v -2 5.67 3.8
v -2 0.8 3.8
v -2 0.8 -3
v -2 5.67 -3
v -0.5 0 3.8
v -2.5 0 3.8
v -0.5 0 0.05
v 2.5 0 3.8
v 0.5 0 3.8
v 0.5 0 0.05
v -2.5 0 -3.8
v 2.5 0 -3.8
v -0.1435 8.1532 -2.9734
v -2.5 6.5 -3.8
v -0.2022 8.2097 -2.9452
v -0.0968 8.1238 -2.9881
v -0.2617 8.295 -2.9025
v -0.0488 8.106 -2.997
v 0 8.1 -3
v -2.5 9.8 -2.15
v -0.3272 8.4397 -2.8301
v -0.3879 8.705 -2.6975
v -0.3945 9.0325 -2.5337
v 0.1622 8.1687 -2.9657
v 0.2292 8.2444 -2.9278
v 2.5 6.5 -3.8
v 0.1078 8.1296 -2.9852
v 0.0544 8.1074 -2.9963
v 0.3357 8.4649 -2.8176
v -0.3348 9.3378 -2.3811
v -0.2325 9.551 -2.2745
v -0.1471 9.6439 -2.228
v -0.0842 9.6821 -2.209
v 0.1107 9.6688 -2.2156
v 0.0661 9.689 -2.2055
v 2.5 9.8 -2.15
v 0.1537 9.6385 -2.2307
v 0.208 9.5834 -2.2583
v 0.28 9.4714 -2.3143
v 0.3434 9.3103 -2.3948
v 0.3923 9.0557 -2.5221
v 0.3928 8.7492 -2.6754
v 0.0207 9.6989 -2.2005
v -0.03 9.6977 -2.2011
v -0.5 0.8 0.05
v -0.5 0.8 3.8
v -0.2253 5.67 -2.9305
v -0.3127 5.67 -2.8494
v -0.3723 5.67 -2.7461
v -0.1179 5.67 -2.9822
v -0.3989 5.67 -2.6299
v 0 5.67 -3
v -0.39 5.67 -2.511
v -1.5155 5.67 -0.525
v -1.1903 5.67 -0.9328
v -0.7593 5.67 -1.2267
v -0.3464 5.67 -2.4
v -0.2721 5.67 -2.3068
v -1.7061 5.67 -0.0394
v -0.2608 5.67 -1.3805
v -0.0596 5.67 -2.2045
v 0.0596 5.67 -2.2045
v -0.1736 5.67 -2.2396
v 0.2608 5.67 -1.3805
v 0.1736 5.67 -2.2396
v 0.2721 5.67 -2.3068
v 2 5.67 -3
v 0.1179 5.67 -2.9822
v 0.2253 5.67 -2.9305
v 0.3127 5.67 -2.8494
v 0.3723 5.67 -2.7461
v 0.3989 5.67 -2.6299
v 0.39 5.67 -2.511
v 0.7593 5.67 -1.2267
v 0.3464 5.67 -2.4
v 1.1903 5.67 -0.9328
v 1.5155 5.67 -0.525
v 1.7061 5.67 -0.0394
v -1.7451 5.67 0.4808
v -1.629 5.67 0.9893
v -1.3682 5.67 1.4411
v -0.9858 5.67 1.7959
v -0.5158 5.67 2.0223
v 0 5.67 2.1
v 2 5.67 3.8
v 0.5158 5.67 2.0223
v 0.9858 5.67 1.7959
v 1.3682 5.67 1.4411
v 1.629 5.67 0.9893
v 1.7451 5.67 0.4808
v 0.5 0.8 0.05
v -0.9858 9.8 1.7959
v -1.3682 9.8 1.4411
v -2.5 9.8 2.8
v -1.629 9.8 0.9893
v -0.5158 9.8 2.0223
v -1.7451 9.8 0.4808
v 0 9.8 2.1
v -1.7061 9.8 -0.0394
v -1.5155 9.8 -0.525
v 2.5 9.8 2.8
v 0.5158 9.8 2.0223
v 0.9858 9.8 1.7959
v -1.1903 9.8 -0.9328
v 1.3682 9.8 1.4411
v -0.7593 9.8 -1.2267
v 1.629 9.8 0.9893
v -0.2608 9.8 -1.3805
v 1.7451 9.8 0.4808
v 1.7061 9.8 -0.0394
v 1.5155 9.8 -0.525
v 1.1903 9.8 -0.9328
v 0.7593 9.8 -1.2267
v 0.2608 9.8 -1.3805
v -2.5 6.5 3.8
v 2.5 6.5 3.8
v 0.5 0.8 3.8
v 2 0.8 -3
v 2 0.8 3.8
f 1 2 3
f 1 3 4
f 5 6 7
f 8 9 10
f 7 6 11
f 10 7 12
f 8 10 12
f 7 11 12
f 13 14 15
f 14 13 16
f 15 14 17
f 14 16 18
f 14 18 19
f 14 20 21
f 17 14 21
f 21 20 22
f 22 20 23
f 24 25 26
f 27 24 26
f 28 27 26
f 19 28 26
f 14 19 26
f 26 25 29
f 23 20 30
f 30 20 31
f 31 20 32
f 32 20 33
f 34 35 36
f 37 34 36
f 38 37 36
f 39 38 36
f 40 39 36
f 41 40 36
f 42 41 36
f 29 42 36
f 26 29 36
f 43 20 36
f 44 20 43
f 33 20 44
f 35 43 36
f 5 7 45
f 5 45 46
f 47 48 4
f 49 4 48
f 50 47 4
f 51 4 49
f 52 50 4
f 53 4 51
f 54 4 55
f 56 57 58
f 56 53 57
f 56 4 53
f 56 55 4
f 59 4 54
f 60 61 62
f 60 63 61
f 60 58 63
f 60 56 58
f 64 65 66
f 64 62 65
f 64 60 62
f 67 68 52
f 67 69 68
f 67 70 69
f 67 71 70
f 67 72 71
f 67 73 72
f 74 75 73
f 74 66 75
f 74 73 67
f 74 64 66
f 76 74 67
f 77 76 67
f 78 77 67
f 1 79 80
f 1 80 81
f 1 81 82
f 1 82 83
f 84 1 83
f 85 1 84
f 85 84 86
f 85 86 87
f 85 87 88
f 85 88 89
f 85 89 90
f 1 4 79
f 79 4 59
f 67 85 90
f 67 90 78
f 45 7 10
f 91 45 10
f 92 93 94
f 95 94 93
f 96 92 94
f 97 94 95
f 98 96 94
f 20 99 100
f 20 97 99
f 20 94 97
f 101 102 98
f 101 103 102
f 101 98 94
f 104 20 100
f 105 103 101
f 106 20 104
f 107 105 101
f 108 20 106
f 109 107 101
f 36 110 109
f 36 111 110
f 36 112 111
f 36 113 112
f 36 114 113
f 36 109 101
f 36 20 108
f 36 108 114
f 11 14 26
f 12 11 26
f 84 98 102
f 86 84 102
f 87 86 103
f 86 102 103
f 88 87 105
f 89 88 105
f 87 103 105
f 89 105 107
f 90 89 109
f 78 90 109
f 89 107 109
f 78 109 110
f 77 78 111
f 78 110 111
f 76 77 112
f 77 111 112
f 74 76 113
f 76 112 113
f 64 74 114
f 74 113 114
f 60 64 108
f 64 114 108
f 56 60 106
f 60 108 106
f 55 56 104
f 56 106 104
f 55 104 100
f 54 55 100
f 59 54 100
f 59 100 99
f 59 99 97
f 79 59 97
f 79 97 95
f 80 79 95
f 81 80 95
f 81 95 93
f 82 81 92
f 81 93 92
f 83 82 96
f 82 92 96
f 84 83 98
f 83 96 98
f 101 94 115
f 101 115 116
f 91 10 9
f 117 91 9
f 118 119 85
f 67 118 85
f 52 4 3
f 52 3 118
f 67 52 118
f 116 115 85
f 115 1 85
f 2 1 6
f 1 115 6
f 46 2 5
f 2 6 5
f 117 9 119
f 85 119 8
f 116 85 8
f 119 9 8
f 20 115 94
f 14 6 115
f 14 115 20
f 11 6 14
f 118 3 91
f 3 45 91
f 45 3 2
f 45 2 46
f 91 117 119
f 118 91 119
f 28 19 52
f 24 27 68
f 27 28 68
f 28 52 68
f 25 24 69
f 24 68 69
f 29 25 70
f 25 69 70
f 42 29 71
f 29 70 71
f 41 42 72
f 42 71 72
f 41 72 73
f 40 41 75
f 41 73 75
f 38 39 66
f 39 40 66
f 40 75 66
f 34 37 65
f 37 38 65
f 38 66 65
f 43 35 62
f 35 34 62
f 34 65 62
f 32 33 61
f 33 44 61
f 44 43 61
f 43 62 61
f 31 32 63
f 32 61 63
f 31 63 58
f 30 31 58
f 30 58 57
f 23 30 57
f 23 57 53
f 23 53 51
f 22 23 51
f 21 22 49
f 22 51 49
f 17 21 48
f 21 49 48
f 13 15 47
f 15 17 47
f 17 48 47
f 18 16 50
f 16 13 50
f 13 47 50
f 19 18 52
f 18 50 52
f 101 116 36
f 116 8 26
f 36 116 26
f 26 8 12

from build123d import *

# Parameters (mm, degrees)
SKETCH_1_W          = 5
SKETCH_1_H          = 7.6
EXTRUDE_1_DEPTH     = 6.5
SKETCH_2_W          = 1
SKETCH_2_H          = 3.75
CUT_EXTRUDE_1_DEPTH = 2
SKETCH_3_W          = 4
SKETCH_3_H          = 4.87
CUT_EXTRUDE_2_DEPTH = 6.8
SKETCH_4_W          = 5
SKETCH_4_H          = 7.6
EXTRUDE_2_DEPTH     = 3.3
CHAMFER_1_SIZE      = 3.3
CHAMFER_1_SIZE2     = 1
CHAMFER_2_SIZE      = 3.3
CHAMFER_2_SIZE2     = 1.65
SKETCH_5_R          = 0.4
CUT_EXTRUDE_3_DEPTH = 5
SKETCH_6_R          = 1.75
CUT_EXTRUDE_4_DEPTH = 4.13


with BuildPart() as part:
    # Эскиз1 → Бобышка-Вытянуть1 (new body)
    with BuildSketch(Plane(origin=(0, 0, 0), x_dir=(1, 0, 0), z_dir=(0, 1, 0))):
        Rectangle(SKETCH_1_W, SKETCH_1_H)
    extrude(amount=EXTRUDE_1_DEPTH)

    # Эскиз2 → Вырез-Вытянуть1 (cut)
    with BuildSketch(Plane.XZ):
        with Locations((0, 1.925)):
            Rectangle(SKETCH_2_W, SKETCH_2_H)
    extrude(amount=-CUT_EXTRUDE_1_DEPTH, mode=Mode.SUBTRACT)

    # Эскиз3 → Вырез-Вытянуть2 (cut)
    with BuildSketch(Plane.XY.offset(3.8)):
        with Locations((0, 3.235)):
            Rectangle(SKETCH_3_W, SKETCH_3_H)
    extrude(amount=-CUT_EXTRUDE_2_DEPTH, mode=Mode.SUBTRACT)

    # Эскиз4 → Бобышка-Вытянуть2 (add)
    with BuildSketch(Plane(origin=(0, 6.5, 0), x_dir=(1, 0, 0), z_dir=(0, 1, 0))):
        Rectangle(SKETCH_4_W, SKETCH_4_H)
    extrude(amount=EXTRUDE_2_DEPTH)

    # Фаска1
    chamfer_1_edges = [part.edges().sort_by_distance(p)[0] for p in [
        (0, 9.8, 3.8),
    ]]
    chamfer_1_side = [part.faces().sort_by_distance(p)[0] for p in [
        (0, 6.154672702, 3.8),
    ]]
    chamfer(chamfer_1_edges, length=CHAMFER_1_SIZE, length2=CHAMFER_1_SIZE2, reference=chamfer_1_side[0])

    # Фаска2
    chamfer_2_edges = [part.edges().sort_by_distance(p)[0] for p in [
        (0, 9.8, -3.8),
    ]]
    chamfer_2_side = [part.faces().sort_by_distance(p)[0] for p in [
        (0, 4.9, -3.8),
    ]]
    chamfer(chamfer_2_edges, length=CHAMFER_2_SIZE, length2=CHAMFER_2_SIZE2, reference=chamfer_2_side[0])

    # Эскиз5 → Вырез-Вытянуть3 (cut)
    with BuildSketch(Plane.XZ.offset(-5.67)):
        with Locations(Location((0, -2.6, 0), (0, 0, 270))):
            Circle(SKETCH_5_R)
    extrude(amount=-CUT_EXTRUDE_3_DEPTH, mode=Mode.SUBTRACT)

    # Эскиз6 → Вырез-Вытянуть4 (cut)
    with BuildSketch(Plane(origin=(0, 9.8, 0), x_dir=(1, 0, 0), z_dir=(0, 1, 0))):
        with Locations(Location((0, -0.35, 0), (0, 0, 270))):
            Circle(SKETCH_6_R)
    extrude(amount=-CUT_EXTRUDE_4_DEPTH, mode=Mode.SUBTRACT)


solid = part.part
